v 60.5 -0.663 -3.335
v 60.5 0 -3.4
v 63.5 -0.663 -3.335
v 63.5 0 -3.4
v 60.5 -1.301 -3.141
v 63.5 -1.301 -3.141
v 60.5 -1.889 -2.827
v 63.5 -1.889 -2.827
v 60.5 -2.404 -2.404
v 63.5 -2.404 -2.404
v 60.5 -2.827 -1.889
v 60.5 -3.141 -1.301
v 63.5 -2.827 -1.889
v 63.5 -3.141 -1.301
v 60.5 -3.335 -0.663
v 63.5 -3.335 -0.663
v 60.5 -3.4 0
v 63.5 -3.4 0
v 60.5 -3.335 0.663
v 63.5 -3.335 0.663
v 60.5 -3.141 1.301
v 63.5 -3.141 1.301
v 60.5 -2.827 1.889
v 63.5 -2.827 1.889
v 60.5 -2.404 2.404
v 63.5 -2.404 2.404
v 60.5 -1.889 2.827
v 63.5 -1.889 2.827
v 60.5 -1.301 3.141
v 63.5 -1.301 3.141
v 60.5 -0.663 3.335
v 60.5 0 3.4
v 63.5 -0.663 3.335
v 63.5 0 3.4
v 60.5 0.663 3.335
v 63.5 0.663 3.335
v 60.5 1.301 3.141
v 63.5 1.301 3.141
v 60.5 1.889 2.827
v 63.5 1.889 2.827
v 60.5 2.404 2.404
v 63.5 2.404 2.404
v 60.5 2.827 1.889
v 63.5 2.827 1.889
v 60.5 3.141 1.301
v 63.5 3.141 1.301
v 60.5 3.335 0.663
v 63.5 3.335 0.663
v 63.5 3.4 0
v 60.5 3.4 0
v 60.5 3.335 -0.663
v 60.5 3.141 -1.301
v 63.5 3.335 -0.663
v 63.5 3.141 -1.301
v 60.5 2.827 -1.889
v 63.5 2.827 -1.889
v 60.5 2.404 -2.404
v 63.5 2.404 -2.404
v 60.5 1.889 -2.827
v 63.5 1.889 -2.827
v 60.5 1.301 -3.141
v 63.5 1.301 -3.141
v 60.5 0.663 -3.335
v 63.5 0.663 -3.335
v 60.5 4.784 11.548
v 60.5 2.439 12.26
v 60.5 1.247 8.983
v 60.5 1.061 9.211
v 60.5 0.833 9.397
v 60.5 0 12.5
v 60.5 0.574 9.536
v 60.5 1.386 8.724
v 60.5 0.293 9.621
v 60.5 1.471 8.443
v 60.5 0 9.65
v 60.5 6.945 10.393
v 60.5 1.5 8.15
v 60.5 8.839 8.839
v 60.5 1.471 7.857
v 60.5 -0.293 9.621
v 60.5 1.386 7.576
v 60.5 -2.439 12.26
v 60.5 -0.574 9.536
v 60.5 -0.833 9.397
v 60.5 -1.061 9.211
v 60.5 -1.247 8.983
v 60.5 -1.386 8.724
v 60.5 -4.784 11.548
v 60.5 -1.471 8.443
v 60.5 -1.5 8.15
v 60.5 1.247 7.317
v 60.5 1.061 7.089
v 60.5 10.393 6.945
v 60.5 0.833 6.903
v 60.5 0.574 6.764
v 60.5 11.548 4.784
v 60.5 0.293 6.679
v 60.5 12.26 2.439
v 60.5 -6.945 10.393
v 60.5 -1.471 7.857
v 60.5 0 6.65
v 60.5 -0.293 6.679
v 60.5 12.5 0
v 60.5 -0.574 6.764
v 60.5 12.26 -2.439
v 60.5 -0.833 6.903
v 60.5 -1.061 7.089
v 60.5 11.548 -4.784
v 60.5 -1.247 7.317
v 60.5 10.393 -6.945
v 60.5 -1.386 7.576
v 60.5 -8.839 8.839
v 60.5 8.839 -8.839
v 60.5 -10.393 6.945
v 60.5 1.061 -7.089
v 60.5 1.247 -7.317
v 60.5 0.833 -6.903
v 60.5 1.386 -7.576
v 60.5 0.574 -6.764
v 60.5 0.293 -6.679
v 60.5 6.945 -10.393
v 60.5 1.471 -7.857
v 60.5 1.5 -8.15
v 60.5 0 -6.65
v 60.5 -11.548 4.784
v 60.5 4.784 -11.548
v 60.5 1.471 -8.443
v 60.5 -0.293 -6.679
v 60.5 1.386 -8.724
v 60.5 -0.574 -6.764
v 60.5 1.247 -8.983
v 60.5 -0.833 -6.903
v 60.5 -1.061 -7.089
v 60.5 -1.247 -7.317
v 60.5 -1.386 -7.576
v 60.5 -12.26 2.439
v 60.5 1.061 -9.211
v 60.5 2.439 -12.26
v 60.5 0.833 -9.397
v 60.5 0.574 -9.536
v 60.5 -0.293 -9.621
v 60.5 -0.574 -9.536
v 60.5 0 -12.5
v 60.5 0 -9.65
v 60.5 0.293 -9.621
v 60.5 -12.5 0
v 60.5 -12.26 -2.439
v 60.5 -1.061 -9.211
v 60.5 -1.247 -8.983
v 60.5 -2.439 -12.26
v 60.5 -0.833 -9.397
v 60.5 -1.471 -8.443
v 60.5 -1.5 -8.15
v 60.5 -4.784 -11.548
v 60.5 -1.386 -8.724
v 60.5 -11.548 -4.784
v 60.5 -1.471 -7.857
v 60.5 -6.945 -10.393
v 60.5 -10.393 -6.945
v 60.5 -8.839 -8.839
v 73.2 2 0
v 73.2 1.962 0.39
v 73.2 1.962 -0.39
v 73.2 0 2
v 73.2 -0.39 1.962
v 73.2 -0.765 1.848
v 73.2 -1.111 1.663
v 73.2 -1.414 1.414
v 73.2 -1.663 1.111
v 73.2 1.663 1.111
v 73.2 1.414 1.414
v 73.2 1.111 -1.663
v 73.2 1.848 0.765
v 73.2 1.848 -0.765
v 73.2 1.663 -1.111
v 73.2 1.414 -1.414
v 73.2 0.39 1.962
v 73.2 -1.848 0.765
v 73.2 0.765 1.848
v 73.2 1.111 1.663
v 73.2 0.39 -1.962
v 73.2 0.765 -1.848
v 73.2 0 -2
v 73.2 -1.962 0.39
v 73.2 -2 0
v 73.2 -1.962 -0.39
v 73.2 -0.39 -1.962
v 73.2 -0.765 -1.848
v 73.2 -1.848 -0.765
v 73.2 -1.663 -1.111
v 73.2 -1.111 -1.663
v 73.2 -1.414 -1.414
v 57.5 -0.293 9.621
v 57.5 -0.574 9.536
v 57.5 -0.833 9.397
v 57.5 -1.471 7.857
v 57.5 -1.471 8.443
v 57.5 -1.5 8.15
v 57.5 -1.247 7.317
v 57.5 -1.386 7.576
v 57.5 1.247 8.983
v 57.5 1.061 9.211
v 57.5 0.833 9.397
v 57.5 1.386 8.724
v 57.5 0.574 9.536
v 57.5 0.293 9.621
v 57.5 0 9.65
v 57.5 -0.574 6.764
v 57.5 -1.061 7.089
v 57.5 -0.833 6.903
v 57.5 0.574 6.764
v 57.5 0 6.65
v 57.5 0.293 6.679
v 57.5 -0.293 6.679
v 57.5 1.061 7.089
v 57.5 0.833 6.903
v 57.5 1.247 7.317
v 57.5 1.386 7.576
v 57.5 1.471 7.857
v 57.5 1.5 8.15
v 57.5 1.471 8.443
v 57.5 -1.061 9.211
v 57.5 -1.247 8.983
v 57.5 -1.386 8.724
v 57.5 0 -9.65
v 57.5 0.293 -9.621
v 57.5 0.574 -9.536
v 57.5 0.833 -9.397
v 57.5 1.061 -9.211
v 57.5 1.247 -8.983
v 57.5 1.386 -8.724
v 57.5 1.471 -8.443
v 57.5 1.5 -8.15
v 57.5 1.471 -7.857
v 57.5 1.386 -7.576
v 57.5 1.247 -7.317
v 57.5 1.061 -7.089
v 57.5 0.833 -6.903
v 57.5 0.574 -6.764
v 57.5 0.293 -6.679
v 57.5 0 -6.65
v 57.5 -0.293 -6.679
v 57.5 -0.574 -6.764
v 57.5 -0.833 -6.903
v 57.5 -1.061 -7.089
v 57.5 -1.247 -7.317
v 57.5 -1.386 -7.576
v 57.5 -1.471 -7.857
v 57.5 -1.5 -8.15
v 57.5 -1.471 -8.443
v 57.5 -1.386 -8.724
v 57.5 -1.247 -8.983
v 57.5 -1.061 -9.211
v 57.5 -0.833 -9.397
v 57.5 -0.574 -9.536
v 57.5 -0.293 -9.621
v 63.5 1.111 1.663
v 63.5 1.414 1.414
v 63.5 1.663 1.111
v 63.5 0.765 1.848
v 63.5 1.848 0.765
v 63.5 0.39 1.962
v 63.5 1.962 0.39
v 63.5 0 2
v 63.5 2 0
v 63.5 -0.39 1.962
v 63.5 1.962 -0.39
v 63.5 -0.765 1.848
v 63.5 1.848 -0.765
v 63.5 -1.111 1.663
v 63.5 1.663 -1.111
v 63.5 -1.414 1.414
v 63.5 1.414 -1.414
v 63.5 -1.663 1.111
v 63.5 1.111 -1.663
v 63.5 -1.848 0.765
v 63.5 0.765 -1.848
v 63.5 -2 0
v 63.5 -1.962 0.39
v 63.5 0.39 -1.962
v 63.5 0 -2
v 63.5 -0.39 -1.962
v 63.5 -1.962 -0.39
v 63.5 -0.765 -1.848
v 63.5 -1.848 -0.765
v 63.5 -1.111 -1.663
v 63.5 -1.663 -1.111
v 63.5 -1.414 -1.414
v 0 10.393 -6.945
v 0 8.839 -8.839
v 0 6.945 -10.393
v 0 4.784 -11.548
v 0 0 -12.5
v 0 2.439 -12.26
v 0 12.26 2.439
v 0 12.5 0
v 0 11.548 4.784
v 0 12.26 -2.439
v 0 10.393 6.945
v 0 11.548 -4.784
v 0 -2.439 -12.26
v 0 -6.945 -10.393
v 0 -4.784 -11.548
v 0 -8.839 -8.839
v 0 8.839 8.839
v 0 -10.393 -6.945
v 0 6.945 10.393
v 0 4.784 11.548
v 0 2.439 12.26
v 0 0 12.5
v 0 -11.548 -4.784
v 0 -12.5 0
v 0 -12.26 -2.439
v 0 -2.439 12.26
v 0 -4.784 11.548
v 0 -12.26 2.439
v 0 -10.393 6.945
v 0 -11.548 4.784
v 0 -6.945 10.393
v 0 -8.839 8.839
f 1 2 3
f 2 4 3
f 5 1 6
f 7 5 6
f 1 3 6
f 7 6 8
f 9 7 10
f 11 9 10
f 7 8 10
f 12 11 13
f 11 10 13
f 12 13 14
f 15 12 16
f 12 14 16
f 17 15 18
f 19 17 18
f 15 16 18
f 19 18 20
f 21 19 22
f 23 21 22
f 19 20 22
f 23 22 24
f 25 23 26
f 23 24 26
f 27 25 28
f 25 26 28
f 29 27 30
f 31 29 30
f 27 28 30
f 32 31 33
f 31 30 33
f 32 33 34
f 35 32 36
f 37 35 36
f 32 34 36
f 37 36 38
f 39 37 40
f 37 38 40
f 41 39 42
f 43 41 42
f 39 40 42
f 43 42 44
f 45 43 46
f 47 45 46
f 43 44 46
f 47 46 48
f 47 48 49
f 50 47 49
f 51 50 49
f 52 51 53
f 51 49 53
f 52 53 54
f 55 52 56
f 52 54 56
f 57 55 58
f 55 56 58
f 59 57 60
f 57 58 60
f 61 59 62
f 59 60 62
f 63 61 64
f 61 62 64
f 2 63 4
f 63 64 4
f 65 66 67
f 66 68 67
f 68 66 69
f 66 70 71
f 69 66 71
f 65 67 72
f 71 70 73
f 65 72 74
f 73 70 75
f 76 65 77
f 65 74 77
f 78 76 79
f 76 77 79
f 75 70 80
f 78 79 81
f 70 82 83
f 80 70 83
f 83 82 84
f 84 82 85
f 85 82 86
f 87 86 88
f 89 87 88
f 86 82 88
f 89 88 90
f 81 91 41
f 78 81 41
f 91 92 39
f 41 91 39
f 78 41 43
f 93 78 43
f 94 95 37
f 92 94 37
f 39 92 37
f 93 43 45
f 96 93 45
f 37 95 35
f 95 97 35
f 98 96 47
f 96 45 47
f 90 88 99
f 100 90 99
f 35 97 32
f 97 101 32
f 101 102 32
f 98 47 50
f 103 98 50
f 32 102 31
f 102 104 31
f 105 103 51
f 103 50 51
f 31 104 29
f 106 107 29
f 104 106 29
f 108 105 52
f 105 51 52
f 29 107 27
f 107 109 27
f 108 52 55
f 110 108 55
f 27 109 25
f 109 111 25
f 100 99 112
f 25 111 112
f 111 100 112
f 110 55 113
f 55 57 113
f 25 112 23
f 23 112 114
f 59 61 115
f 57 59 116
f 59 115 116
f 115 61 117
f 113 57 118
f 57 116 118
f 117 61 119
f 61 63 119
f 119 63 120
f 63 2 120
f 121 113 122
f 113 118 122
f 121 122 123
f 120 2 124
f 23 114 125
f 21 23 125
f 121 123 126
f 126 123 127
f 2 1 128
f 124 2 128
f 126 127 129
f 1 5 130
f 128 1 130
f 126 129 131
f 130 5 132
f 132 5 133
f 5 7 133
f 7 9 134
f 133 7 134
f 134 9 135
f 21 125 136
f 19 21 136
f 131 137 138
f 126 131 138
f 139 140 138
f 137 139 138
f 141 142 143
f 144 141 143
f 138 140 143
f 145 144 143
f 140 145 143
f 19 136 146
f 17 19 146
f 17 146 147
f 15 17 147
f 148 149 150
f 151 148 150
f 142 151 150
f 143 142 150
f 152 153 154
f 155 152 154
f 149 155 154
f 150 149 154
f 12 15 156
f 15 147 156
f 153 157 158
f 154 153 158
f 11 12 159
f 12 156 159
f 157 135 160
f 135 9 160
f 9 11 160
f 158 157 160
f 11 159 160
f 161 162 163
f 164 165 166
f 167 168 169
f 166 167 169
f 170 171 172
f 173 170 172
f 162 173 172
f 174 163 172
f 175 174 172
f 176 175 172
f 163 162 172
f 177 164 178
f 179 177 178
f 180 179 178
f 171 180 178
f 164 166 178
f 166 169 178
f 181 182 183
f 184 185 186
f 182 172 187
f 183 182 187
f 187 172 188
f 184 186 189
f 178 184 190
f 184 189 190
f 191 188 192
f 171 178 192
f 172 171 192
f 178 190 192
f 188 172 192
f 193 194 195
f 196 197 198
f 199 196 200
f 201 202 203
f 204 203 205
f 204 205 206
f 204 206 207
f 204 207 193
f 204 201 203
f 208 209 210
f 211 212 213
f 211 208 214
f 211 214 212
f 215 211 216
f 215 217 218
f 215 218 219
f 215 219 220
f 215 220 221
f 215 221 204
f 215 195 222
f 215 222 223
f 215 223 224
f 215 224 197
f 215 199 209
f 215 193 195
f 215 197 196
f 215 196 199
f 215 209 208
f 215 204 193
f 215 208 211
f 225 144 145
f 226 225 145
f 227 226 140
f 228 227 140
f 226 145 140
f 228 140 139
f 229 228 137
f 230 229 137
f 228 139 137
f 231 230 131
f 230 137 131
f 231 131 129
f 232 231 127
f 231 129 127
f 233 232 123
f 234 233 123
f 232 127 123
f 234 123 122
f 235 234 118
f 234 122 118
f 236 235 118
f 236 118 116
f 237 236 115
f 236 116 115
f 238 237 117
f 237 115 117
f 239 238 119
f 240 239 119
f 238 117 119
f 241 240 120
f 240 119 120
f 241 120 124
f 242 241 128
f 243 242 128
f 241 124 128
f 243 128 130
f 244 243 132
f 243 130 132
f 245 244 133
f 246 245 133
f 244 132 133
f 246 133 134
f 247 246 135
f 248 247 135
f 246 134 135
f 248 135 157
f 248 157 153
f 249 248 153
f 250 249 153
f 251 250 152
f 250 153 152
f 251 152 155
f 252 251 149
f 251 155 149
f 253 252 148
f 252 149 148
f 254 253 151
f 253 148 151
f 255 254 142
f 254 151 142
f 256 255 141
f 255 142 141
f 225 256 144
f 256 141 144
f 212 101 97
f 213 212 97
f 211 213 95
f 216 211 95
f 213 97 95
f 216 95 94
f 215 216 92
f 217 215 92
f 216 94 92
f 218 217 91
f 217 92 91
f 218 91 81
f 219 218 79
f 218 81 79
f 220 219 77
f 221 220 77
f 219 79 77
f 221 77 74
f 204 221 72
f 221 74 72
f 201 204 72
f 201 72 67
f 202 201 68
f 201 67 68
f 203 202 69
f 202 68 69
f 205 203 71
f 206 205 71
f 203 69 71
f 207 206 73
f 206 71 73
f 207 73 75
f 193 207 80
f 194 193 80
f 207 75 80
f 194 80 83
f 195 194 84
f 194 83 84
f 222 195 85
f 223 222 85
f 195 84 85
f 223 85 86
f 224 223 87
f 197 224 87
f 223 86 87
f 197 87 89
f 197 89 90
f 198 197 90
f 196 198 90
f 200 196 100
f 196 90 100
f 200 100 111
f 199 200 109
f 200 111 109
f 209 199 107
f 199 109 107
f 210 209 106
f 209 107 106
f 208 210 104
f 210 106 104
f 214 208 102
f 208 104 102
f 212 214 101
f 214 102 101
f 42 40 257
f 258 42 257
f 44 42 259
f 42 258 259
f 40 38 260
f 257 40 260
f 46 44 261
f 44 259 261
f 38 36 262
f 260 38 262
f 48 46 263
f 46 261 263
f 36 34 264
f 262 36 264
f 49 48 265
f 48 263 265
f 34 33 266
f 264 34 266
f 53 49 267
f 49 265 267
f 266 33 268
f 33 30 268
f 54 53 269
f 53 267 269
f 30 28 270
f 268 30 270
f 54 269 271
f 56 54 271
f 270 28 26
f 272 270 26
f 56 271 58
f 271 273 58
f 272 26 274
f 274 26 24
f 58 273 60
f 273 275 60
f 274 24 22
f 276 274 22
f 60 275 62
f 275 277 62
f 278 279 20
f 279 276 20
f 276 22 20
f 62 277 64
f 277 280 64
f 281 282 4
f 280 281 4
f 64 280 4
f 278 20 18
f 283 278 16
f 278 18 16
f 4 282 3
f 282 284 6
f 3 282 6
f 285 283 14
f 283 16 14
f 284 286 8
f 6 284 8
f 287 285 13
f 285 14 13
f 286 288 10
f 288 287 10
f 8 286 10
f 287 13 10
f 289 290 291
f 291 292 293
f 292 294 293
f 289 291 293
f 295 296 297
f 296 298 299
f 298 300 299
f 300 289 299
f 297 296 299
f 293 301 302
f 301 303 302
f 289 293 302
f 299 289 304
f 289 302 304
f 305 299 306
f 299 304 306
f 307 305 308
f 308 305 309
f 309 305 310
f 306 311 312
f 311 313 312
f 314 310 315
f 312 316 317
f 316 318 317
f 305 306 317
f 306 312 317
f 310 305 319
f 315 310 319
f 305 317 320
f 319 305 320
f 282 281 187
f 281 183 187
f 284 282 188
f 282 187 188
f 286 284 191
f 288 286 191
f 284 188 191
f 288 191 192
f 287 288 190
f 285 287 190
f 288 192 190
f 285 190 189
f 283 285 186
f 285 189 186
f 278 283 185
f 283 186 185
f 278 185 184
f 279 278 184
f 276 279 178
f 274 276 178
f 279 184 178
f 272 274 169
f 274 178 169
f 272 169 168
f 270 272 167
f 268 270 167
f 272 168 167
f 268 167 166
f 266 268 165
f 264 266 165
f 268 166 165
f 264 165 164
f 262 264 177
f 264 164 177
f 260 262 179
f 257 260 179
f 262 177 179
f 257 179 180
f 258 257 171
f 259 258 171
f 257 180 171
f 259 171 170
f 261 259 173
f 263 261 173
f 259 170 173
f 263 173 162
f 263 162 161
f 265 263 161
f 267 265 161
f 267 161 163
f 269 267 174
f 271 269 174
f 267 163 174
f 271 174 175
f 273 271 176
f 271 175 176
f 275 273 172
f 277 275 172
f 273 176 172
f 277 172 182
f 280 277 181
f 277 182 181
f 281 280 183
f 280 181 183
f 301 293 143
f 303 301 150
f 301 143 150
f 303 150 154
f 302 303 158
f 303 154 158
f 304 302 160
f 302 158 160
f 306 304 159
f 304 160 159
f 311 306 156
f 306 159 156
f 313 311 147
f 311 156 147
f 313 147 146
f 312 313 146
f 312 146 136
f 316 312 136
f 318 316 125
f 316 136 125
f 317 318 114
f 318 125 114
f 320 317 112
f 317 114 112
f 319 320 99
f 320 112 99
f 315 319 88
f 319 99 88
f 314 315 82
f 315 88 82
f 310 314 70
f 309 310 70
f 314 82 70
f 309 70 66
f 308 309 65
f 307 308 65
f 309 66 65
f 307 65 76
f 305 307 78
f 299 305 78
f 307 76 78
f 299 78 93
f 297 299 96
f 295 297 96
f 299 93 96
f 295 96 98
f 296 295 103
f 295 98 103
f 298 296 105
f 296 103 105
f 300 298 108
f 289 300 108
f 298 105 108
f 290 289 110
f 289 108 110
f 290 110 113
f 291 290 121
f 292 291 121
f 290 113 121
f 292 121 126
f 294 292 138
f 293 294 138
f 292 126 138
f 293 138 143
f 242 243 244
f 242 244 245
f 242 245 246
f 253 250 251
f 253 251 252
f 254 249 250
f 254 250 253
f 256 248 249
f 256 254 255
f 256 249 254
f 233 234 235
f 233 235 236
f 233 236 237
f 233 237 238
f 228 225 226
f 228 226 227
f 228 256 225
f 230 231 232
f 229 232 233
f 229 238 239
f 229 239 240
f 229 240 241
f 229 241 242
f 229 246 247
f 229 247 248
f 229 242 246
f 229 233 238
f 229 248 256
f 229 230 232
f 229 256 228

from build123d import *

# Parameters (mm, degrees)
SKETCH3_R          = 1.5
CUT_EXTRUDE1_DEPTH = 3


with BuildPart() as part:
    # Sketch2 → Revolve1 (revolve)
    with BuildSketch(Plane.XY, mode=Mode.PRIVATE) as revolve1_sk:
        Polygon((0, 0), (0, 12.5), (60.5, 12.5), (60.5, 3.400000058), (63.5, 3.400000058), (63.5, 2), (73.2, 2), (73.2, 0), align=None)
    revolve(revolve1_sk.sketch.rotate(Axis((73.2, 0, 0), (-1, 0, 0)), 90), axis=Axis((73.2, 0, 0), (-1, 0, 0)))

    # Sketch3 → Cut-Extrude1 (cut)
    with BuildSketch(Plane(origin=(60.5, 0, 0), x_dir=(0, 0, -1), z_dir=(1, 0, 0))):
        with Locations((8.15, 0)):
            Circle(SKETCH3_R)
        with Locations((-8.15, 0)):
            Circle(SKETCH3_R)
    extrude(amount=-CUT_EXTRUDE1_DEPTH, mode=Mode.SUBTRACT)


solid = part.part
